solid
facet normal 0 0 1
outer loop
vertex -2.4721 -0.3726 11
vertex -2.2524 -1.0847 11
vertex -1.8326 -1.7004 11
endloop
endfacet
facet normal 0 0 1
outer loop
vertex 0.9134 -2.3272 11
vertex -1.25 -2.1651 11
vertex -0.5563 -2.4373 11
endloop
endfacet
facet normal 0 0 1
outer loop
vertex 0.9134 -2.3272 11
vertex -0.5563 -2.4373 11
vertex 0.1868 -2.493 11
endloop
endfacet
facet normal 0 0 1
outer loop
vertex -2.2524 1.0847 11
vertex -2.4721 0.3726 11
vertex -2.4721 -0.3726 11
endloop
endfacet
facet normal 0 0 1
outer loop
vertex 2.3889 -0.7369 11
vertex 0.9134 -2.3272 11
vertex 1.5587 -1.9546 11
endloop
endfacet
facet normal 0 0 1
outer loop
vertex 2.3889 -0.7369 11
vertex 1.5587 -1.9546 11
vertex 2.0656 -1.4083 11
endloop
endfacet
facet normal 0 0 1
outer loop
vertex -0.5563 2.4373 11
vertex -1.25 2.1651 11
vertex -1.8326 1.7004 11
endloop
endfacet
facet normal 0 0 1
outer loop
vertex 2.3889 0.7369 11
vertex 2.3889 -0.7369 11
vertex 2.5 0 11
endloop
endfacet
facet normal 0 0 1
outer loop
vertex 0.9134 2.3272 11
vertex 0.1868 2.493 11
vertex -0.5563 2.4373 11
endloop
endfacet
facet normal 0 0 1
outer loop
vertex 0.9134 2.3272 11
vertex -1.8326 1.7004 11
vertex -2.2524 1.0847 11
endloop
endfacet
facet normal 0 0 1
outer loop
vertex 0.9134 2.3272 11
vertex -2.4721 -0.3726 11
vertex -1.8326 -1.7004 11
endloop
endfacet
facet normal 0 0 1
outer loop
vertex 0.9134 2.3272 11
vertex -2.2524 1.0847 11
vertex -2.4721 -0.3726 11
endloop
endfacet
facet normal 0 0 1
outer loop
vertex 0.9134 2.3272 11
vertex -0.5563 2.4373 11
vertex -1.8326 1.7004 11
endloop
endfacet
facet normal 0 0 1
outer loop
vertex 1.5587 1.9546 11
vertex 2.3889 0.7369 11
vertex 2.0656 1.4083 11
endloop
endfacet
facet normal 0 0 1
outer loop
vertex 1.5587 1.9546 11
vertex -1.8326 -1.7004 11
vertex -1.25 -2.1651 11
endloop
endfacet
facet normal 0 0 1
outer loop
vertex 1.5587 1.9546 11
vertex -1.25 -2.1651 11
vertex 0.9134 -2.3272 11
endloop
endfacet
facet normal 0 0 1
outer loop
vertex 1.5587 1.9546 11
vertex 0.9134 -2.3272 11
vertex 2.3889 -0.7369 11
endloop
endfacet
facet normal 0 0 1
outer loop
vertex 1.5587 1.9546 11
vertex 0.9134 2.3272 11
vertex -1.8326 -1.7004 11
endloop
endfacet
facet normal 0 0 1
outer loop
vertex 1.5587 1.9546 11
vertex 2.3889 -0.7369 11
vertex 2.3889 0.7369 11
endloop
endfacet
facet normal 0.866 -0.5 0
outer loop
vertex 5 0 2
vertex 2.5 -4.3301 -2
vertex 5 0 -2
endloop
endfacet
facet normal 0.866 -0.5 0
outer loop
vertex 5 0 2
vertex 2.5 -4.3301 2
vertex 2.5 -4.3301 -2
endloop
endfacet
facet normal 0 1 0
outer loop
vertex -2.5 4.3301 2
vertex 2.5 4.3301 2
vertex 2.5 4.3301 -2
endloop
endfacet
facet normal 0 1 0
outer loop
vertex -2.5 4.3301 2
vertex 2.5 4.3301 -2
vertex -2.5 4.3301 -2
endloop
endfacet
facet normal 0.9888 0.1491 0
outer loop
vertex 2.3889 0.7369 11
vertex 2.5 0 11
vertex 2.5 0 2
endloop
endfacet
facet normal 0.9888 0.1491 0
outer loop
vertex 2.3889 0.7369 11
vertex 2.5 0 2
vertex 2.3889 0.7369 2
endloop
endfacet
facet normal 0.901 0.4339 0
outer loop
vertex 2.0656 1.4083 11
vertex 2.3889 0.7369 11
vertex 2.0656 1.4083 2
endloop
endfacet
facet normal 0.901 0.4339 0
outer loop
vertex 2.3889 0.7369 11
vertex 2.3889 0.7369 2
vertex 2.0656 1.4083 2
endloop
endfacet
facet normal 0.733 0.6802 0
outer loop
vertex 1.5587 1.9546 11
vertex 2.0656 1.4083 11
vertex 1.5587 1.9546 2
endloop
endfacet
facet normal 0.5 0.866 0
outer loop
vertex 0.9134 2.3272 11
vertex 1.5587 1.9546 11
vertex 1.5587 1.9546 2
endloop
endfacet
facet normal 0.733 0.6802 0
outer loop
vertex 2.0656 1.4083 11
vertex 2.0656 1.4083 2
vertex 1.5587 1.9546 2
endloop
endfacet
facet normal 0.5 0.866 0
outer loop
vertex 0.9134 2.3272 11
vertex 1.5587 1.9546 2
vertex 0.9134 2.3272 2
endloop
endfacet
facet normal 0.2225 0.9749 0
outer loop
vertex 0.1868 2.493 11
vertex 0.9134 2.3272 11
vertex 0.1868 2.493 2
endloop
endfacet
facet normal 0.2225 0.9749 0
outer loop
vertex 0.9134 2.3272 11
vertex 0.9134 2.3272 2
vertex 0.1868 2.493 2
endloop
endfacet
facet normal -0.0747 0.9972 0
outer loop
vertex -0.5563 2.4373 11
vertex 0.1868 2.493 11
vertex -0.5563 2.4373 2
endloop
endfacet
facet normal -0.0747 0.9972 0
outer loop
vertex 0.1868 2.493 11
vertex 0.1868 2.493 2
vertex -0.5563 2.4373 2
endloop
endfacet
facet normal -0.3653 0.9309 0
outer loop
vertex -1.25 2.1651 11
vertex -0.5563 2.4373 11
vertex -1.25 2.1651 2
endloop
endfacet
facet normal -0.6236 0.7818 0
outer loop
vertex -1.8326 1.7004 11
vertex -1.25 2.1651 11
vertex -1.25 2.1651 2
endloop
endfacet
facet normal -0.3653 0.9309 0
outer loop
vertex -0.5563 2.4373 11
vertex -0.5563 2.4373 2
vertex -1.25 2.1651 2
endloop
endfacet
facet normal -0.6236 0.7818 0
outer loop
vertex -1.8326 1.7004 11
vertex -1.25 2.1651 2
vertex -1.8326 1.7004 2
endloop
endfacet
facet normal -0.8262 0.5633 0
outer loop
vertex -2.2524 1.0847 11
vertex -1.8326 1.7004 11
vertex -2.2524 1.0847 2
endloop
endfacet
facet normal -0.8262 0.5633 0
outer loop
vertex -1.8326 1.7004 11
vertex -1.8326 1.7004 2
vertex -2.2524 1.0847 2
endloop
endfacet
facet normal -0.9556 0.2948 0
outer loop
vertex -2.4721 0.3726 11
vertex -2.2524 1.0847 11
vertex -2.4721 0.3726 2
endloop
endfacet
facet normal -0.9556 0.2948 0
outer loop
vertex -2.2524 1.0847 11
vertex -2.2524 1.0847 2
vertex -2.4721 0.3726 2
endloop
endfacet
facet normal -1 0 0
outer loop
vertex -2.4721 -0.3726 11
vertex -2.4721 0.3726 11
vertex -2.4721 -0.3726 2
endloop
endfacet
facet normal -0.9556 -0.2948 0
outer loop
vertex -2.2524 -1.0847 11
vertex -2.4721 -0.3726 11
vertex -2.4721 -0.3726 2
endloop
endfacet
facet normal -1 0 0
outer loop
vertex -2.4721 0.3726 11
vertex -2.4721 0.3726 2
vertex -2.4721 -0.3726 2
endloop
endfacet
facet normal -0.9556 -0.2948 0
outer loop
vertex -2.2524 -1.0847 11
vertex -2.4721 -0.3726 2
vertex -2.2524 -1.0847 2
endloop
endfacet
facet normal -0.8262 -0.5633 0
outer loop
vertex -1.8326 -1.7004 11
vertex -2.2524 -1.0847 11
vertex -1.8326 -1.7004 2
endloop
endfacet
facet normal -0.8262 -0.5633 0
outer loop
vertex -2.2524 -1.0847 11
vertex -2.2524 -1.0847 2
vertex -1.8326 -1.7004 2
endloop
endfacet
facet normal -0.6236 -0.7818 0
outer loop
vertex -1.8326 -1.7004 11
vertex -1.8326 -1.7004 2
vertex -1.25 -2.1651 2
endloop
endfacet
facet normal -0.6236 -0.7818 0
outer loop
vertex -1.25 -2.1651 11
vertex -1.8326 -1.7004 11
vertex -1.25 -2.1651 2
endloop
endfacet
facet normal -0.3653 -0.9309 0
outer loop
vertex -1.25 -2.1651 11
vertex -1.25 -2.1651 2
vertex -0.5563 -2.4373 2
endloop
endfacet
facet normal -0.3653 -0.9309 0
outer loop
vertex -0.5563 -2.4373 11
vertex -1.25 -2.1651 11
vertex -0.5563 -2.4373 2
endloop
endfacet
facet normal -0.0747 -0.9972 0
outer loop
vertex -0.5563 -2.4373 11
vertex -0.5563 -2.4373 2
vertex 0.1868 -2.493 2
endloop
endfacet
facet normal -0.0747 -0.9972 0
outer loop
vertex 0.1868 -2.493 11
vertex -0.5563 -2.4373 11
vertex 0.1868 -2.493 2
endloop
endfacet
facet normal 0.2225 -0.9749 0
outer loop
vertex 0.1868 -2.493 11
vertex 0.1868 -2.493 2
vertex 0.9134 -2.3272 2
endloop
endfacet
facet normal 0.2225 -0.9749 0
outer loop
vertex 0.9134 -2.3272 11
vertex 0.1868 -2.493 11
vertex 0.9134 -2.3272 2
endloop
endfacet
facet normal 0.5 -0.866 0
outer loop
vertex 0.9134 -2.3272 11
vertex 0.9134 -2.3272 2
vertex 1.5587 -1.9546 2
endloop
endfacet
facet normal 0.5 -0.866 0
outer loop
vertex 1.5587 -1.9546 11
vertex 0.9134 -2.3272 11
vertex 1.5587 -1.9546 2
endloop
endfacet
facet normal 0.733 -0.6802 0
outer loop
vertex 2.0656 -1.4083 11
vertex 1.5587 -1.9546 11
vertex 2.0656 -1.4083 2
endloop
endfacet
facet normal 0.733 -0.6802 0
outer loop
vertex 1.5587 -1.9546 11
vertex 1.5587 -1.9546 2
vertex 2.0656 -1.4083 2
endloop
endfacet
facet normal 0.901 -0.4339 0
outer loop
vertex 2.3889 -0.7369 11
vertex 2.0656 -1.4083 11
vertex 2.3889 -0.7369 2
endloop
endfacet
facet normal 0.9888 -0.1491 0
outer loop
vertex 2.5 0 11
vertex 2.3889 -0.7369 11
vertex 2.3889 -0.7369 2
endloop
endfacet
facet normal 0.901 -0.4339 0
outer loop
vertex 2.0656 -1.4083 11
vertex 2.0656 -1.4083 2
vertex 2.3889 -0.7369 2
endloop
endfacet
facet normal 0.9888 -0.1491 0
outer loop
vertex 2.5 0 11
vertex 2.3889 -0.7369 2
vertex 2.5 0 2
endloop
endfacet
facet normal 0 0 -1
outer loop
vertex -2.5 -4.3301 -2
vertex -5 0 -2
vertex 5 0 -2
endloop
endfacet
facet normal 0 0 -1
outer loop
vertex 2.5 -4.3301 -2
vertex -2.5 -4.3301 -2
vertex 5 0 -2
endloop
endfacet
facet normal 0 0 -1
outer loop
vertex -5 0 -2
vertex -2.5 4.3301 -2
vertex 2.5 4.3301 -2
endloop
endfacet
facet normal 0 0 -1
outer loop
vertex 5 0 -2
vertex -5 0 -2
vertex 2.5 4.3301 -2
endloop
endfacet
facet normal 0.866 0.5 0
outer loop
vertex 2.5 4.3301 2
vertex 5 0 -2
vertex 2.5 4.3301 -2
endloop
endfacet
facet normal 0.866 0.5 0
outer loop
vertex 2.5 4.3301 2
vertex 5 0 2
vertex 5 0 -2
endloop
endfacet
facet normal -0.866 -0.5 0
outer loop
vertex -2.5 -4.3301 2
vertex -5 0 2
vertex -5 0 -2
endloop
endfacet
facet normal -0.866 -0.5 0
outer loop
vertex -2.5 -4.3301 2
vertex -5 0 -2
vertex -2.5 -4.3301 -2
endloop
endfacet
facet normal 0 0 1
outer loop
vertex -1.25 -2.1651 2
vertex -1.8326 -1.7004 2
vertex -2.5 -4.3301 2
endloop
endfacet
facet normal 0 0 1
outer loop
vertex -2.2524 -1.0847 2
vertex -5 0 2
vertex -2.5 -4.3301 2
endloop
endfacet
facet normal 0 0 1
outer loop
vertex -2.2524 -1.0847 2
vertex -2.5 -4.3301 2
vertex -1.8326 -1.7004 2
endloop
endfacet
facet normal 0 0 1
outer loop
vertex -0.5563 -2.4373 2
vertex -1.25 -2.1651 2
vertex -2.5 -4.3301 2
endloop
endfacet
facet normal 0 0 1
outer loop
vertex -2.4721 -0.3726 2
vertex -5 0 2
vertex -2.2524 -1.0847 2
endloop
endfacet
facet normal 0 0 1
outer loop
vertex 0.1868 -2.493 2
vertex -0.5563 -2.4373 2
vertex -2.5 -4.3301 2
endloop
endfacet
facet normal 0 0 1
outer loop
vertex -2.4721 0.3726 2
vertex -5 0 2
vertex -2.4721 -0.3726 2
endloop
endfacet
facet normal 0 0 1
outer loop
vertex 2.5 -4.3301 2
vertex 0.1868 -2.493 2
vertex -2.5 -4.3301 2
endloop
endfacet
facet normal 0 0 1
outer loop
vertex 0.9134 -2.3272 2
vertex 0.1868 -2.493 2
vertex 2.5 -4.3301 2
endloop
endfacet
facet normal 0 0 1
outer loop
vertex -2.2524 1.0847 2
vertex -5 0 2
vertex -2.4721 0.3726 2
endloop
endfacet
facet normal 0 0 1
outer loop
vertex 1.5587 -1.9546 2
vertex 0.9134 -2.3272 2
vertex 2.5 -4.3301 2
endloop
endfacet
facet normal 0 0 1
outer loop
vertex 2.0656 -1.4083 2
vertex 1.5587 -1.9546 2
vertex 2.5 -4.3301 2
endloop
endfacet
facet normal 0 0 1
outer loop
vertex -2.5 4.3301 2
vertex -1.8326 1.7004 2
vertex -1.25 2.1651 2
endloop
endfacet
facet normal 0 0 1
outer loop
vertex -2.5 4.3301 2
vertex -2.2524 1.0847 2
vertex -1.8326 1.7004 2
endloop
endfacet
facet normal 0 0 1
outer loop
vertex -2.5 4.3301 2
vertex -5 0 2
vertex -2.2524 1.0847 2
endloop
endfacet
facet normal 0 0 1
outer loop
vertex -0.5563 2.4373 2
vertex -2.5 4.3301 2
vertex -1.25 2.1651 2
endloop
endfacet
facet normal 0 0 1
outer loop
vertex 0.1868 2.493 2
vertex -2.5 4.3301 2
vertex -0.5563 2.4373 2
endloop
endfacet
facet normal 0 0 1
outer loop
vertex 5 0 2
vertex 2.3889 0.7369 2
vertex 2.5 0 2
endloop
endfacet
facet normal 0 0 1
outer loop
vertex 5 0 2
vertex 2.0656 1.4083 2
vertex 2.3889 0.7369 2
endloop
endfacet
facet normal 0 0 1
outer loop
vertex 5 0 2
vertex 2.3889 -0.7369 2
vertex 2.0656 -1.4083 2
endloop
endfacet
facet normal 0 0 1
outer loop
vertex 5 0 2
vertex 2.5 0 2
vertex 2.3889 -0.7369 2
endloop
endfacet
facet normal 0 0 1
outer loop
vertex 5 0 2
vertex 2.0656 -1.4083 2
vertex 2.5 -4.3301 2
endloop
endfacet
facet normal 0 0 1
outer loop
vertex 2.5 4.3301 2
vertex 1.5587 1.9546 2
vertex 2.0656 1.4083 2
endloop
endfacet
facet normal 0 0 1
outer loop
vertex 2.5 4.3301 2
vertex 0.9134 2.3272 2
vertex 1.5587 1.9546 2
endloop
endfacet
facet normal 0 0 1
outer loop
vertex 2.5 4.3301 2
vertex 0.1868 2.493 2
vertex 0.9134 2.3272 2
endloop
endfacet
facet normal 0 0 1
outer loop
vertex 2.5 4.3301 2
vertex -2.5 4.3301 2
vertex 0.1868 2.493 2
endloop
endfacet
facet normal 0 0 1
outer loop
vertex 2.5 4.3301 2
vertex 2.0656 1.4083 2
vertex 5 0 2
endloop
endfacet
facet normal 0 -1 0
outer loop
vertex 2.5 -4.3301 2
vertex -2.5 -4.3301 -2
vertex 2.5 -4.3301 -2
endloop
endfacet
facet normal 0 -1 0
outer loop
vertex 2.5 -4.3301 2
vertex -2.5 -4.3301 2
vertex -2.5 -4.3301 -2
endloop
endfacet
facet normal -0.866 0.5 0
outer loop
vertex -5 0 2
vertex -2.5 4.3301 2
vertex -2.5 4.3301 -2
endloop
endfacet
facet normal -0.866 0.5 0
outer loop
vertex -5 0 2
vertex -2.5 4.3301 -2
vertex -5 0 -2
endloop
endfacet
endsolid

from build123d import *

# Parameters (mm, degrees)
BOSS_EXTRUDE1_DEPTH = 2
SKETCH2_R           = 2.5
BOSS_EXTRUDE2_DEPTH = 9


with BuildPart() as part:
    # Sketch1 → Boss-Extrude1 (new, symmetric)
    with BuildSketch(Plane.XY):
        Polygon((5, 0), (2.5, 4.330127019), (-2.5, 4.330127019), (-5, 0), (-2.5, -4.330127019), (2.5, -4.330127019), align=None)
    extrude(amount=BOSS_EXTRUDE1_DEPTH, both=True)

    # Sketch2 → Boss-Extrude2 (add)
    with BuildSketch(Plane.XY.offset(2)):
        Circle(SKETCH2_R)
    extrude(amount=BOSS_EXTRUDE2_DEPTH)


solid = part.part
